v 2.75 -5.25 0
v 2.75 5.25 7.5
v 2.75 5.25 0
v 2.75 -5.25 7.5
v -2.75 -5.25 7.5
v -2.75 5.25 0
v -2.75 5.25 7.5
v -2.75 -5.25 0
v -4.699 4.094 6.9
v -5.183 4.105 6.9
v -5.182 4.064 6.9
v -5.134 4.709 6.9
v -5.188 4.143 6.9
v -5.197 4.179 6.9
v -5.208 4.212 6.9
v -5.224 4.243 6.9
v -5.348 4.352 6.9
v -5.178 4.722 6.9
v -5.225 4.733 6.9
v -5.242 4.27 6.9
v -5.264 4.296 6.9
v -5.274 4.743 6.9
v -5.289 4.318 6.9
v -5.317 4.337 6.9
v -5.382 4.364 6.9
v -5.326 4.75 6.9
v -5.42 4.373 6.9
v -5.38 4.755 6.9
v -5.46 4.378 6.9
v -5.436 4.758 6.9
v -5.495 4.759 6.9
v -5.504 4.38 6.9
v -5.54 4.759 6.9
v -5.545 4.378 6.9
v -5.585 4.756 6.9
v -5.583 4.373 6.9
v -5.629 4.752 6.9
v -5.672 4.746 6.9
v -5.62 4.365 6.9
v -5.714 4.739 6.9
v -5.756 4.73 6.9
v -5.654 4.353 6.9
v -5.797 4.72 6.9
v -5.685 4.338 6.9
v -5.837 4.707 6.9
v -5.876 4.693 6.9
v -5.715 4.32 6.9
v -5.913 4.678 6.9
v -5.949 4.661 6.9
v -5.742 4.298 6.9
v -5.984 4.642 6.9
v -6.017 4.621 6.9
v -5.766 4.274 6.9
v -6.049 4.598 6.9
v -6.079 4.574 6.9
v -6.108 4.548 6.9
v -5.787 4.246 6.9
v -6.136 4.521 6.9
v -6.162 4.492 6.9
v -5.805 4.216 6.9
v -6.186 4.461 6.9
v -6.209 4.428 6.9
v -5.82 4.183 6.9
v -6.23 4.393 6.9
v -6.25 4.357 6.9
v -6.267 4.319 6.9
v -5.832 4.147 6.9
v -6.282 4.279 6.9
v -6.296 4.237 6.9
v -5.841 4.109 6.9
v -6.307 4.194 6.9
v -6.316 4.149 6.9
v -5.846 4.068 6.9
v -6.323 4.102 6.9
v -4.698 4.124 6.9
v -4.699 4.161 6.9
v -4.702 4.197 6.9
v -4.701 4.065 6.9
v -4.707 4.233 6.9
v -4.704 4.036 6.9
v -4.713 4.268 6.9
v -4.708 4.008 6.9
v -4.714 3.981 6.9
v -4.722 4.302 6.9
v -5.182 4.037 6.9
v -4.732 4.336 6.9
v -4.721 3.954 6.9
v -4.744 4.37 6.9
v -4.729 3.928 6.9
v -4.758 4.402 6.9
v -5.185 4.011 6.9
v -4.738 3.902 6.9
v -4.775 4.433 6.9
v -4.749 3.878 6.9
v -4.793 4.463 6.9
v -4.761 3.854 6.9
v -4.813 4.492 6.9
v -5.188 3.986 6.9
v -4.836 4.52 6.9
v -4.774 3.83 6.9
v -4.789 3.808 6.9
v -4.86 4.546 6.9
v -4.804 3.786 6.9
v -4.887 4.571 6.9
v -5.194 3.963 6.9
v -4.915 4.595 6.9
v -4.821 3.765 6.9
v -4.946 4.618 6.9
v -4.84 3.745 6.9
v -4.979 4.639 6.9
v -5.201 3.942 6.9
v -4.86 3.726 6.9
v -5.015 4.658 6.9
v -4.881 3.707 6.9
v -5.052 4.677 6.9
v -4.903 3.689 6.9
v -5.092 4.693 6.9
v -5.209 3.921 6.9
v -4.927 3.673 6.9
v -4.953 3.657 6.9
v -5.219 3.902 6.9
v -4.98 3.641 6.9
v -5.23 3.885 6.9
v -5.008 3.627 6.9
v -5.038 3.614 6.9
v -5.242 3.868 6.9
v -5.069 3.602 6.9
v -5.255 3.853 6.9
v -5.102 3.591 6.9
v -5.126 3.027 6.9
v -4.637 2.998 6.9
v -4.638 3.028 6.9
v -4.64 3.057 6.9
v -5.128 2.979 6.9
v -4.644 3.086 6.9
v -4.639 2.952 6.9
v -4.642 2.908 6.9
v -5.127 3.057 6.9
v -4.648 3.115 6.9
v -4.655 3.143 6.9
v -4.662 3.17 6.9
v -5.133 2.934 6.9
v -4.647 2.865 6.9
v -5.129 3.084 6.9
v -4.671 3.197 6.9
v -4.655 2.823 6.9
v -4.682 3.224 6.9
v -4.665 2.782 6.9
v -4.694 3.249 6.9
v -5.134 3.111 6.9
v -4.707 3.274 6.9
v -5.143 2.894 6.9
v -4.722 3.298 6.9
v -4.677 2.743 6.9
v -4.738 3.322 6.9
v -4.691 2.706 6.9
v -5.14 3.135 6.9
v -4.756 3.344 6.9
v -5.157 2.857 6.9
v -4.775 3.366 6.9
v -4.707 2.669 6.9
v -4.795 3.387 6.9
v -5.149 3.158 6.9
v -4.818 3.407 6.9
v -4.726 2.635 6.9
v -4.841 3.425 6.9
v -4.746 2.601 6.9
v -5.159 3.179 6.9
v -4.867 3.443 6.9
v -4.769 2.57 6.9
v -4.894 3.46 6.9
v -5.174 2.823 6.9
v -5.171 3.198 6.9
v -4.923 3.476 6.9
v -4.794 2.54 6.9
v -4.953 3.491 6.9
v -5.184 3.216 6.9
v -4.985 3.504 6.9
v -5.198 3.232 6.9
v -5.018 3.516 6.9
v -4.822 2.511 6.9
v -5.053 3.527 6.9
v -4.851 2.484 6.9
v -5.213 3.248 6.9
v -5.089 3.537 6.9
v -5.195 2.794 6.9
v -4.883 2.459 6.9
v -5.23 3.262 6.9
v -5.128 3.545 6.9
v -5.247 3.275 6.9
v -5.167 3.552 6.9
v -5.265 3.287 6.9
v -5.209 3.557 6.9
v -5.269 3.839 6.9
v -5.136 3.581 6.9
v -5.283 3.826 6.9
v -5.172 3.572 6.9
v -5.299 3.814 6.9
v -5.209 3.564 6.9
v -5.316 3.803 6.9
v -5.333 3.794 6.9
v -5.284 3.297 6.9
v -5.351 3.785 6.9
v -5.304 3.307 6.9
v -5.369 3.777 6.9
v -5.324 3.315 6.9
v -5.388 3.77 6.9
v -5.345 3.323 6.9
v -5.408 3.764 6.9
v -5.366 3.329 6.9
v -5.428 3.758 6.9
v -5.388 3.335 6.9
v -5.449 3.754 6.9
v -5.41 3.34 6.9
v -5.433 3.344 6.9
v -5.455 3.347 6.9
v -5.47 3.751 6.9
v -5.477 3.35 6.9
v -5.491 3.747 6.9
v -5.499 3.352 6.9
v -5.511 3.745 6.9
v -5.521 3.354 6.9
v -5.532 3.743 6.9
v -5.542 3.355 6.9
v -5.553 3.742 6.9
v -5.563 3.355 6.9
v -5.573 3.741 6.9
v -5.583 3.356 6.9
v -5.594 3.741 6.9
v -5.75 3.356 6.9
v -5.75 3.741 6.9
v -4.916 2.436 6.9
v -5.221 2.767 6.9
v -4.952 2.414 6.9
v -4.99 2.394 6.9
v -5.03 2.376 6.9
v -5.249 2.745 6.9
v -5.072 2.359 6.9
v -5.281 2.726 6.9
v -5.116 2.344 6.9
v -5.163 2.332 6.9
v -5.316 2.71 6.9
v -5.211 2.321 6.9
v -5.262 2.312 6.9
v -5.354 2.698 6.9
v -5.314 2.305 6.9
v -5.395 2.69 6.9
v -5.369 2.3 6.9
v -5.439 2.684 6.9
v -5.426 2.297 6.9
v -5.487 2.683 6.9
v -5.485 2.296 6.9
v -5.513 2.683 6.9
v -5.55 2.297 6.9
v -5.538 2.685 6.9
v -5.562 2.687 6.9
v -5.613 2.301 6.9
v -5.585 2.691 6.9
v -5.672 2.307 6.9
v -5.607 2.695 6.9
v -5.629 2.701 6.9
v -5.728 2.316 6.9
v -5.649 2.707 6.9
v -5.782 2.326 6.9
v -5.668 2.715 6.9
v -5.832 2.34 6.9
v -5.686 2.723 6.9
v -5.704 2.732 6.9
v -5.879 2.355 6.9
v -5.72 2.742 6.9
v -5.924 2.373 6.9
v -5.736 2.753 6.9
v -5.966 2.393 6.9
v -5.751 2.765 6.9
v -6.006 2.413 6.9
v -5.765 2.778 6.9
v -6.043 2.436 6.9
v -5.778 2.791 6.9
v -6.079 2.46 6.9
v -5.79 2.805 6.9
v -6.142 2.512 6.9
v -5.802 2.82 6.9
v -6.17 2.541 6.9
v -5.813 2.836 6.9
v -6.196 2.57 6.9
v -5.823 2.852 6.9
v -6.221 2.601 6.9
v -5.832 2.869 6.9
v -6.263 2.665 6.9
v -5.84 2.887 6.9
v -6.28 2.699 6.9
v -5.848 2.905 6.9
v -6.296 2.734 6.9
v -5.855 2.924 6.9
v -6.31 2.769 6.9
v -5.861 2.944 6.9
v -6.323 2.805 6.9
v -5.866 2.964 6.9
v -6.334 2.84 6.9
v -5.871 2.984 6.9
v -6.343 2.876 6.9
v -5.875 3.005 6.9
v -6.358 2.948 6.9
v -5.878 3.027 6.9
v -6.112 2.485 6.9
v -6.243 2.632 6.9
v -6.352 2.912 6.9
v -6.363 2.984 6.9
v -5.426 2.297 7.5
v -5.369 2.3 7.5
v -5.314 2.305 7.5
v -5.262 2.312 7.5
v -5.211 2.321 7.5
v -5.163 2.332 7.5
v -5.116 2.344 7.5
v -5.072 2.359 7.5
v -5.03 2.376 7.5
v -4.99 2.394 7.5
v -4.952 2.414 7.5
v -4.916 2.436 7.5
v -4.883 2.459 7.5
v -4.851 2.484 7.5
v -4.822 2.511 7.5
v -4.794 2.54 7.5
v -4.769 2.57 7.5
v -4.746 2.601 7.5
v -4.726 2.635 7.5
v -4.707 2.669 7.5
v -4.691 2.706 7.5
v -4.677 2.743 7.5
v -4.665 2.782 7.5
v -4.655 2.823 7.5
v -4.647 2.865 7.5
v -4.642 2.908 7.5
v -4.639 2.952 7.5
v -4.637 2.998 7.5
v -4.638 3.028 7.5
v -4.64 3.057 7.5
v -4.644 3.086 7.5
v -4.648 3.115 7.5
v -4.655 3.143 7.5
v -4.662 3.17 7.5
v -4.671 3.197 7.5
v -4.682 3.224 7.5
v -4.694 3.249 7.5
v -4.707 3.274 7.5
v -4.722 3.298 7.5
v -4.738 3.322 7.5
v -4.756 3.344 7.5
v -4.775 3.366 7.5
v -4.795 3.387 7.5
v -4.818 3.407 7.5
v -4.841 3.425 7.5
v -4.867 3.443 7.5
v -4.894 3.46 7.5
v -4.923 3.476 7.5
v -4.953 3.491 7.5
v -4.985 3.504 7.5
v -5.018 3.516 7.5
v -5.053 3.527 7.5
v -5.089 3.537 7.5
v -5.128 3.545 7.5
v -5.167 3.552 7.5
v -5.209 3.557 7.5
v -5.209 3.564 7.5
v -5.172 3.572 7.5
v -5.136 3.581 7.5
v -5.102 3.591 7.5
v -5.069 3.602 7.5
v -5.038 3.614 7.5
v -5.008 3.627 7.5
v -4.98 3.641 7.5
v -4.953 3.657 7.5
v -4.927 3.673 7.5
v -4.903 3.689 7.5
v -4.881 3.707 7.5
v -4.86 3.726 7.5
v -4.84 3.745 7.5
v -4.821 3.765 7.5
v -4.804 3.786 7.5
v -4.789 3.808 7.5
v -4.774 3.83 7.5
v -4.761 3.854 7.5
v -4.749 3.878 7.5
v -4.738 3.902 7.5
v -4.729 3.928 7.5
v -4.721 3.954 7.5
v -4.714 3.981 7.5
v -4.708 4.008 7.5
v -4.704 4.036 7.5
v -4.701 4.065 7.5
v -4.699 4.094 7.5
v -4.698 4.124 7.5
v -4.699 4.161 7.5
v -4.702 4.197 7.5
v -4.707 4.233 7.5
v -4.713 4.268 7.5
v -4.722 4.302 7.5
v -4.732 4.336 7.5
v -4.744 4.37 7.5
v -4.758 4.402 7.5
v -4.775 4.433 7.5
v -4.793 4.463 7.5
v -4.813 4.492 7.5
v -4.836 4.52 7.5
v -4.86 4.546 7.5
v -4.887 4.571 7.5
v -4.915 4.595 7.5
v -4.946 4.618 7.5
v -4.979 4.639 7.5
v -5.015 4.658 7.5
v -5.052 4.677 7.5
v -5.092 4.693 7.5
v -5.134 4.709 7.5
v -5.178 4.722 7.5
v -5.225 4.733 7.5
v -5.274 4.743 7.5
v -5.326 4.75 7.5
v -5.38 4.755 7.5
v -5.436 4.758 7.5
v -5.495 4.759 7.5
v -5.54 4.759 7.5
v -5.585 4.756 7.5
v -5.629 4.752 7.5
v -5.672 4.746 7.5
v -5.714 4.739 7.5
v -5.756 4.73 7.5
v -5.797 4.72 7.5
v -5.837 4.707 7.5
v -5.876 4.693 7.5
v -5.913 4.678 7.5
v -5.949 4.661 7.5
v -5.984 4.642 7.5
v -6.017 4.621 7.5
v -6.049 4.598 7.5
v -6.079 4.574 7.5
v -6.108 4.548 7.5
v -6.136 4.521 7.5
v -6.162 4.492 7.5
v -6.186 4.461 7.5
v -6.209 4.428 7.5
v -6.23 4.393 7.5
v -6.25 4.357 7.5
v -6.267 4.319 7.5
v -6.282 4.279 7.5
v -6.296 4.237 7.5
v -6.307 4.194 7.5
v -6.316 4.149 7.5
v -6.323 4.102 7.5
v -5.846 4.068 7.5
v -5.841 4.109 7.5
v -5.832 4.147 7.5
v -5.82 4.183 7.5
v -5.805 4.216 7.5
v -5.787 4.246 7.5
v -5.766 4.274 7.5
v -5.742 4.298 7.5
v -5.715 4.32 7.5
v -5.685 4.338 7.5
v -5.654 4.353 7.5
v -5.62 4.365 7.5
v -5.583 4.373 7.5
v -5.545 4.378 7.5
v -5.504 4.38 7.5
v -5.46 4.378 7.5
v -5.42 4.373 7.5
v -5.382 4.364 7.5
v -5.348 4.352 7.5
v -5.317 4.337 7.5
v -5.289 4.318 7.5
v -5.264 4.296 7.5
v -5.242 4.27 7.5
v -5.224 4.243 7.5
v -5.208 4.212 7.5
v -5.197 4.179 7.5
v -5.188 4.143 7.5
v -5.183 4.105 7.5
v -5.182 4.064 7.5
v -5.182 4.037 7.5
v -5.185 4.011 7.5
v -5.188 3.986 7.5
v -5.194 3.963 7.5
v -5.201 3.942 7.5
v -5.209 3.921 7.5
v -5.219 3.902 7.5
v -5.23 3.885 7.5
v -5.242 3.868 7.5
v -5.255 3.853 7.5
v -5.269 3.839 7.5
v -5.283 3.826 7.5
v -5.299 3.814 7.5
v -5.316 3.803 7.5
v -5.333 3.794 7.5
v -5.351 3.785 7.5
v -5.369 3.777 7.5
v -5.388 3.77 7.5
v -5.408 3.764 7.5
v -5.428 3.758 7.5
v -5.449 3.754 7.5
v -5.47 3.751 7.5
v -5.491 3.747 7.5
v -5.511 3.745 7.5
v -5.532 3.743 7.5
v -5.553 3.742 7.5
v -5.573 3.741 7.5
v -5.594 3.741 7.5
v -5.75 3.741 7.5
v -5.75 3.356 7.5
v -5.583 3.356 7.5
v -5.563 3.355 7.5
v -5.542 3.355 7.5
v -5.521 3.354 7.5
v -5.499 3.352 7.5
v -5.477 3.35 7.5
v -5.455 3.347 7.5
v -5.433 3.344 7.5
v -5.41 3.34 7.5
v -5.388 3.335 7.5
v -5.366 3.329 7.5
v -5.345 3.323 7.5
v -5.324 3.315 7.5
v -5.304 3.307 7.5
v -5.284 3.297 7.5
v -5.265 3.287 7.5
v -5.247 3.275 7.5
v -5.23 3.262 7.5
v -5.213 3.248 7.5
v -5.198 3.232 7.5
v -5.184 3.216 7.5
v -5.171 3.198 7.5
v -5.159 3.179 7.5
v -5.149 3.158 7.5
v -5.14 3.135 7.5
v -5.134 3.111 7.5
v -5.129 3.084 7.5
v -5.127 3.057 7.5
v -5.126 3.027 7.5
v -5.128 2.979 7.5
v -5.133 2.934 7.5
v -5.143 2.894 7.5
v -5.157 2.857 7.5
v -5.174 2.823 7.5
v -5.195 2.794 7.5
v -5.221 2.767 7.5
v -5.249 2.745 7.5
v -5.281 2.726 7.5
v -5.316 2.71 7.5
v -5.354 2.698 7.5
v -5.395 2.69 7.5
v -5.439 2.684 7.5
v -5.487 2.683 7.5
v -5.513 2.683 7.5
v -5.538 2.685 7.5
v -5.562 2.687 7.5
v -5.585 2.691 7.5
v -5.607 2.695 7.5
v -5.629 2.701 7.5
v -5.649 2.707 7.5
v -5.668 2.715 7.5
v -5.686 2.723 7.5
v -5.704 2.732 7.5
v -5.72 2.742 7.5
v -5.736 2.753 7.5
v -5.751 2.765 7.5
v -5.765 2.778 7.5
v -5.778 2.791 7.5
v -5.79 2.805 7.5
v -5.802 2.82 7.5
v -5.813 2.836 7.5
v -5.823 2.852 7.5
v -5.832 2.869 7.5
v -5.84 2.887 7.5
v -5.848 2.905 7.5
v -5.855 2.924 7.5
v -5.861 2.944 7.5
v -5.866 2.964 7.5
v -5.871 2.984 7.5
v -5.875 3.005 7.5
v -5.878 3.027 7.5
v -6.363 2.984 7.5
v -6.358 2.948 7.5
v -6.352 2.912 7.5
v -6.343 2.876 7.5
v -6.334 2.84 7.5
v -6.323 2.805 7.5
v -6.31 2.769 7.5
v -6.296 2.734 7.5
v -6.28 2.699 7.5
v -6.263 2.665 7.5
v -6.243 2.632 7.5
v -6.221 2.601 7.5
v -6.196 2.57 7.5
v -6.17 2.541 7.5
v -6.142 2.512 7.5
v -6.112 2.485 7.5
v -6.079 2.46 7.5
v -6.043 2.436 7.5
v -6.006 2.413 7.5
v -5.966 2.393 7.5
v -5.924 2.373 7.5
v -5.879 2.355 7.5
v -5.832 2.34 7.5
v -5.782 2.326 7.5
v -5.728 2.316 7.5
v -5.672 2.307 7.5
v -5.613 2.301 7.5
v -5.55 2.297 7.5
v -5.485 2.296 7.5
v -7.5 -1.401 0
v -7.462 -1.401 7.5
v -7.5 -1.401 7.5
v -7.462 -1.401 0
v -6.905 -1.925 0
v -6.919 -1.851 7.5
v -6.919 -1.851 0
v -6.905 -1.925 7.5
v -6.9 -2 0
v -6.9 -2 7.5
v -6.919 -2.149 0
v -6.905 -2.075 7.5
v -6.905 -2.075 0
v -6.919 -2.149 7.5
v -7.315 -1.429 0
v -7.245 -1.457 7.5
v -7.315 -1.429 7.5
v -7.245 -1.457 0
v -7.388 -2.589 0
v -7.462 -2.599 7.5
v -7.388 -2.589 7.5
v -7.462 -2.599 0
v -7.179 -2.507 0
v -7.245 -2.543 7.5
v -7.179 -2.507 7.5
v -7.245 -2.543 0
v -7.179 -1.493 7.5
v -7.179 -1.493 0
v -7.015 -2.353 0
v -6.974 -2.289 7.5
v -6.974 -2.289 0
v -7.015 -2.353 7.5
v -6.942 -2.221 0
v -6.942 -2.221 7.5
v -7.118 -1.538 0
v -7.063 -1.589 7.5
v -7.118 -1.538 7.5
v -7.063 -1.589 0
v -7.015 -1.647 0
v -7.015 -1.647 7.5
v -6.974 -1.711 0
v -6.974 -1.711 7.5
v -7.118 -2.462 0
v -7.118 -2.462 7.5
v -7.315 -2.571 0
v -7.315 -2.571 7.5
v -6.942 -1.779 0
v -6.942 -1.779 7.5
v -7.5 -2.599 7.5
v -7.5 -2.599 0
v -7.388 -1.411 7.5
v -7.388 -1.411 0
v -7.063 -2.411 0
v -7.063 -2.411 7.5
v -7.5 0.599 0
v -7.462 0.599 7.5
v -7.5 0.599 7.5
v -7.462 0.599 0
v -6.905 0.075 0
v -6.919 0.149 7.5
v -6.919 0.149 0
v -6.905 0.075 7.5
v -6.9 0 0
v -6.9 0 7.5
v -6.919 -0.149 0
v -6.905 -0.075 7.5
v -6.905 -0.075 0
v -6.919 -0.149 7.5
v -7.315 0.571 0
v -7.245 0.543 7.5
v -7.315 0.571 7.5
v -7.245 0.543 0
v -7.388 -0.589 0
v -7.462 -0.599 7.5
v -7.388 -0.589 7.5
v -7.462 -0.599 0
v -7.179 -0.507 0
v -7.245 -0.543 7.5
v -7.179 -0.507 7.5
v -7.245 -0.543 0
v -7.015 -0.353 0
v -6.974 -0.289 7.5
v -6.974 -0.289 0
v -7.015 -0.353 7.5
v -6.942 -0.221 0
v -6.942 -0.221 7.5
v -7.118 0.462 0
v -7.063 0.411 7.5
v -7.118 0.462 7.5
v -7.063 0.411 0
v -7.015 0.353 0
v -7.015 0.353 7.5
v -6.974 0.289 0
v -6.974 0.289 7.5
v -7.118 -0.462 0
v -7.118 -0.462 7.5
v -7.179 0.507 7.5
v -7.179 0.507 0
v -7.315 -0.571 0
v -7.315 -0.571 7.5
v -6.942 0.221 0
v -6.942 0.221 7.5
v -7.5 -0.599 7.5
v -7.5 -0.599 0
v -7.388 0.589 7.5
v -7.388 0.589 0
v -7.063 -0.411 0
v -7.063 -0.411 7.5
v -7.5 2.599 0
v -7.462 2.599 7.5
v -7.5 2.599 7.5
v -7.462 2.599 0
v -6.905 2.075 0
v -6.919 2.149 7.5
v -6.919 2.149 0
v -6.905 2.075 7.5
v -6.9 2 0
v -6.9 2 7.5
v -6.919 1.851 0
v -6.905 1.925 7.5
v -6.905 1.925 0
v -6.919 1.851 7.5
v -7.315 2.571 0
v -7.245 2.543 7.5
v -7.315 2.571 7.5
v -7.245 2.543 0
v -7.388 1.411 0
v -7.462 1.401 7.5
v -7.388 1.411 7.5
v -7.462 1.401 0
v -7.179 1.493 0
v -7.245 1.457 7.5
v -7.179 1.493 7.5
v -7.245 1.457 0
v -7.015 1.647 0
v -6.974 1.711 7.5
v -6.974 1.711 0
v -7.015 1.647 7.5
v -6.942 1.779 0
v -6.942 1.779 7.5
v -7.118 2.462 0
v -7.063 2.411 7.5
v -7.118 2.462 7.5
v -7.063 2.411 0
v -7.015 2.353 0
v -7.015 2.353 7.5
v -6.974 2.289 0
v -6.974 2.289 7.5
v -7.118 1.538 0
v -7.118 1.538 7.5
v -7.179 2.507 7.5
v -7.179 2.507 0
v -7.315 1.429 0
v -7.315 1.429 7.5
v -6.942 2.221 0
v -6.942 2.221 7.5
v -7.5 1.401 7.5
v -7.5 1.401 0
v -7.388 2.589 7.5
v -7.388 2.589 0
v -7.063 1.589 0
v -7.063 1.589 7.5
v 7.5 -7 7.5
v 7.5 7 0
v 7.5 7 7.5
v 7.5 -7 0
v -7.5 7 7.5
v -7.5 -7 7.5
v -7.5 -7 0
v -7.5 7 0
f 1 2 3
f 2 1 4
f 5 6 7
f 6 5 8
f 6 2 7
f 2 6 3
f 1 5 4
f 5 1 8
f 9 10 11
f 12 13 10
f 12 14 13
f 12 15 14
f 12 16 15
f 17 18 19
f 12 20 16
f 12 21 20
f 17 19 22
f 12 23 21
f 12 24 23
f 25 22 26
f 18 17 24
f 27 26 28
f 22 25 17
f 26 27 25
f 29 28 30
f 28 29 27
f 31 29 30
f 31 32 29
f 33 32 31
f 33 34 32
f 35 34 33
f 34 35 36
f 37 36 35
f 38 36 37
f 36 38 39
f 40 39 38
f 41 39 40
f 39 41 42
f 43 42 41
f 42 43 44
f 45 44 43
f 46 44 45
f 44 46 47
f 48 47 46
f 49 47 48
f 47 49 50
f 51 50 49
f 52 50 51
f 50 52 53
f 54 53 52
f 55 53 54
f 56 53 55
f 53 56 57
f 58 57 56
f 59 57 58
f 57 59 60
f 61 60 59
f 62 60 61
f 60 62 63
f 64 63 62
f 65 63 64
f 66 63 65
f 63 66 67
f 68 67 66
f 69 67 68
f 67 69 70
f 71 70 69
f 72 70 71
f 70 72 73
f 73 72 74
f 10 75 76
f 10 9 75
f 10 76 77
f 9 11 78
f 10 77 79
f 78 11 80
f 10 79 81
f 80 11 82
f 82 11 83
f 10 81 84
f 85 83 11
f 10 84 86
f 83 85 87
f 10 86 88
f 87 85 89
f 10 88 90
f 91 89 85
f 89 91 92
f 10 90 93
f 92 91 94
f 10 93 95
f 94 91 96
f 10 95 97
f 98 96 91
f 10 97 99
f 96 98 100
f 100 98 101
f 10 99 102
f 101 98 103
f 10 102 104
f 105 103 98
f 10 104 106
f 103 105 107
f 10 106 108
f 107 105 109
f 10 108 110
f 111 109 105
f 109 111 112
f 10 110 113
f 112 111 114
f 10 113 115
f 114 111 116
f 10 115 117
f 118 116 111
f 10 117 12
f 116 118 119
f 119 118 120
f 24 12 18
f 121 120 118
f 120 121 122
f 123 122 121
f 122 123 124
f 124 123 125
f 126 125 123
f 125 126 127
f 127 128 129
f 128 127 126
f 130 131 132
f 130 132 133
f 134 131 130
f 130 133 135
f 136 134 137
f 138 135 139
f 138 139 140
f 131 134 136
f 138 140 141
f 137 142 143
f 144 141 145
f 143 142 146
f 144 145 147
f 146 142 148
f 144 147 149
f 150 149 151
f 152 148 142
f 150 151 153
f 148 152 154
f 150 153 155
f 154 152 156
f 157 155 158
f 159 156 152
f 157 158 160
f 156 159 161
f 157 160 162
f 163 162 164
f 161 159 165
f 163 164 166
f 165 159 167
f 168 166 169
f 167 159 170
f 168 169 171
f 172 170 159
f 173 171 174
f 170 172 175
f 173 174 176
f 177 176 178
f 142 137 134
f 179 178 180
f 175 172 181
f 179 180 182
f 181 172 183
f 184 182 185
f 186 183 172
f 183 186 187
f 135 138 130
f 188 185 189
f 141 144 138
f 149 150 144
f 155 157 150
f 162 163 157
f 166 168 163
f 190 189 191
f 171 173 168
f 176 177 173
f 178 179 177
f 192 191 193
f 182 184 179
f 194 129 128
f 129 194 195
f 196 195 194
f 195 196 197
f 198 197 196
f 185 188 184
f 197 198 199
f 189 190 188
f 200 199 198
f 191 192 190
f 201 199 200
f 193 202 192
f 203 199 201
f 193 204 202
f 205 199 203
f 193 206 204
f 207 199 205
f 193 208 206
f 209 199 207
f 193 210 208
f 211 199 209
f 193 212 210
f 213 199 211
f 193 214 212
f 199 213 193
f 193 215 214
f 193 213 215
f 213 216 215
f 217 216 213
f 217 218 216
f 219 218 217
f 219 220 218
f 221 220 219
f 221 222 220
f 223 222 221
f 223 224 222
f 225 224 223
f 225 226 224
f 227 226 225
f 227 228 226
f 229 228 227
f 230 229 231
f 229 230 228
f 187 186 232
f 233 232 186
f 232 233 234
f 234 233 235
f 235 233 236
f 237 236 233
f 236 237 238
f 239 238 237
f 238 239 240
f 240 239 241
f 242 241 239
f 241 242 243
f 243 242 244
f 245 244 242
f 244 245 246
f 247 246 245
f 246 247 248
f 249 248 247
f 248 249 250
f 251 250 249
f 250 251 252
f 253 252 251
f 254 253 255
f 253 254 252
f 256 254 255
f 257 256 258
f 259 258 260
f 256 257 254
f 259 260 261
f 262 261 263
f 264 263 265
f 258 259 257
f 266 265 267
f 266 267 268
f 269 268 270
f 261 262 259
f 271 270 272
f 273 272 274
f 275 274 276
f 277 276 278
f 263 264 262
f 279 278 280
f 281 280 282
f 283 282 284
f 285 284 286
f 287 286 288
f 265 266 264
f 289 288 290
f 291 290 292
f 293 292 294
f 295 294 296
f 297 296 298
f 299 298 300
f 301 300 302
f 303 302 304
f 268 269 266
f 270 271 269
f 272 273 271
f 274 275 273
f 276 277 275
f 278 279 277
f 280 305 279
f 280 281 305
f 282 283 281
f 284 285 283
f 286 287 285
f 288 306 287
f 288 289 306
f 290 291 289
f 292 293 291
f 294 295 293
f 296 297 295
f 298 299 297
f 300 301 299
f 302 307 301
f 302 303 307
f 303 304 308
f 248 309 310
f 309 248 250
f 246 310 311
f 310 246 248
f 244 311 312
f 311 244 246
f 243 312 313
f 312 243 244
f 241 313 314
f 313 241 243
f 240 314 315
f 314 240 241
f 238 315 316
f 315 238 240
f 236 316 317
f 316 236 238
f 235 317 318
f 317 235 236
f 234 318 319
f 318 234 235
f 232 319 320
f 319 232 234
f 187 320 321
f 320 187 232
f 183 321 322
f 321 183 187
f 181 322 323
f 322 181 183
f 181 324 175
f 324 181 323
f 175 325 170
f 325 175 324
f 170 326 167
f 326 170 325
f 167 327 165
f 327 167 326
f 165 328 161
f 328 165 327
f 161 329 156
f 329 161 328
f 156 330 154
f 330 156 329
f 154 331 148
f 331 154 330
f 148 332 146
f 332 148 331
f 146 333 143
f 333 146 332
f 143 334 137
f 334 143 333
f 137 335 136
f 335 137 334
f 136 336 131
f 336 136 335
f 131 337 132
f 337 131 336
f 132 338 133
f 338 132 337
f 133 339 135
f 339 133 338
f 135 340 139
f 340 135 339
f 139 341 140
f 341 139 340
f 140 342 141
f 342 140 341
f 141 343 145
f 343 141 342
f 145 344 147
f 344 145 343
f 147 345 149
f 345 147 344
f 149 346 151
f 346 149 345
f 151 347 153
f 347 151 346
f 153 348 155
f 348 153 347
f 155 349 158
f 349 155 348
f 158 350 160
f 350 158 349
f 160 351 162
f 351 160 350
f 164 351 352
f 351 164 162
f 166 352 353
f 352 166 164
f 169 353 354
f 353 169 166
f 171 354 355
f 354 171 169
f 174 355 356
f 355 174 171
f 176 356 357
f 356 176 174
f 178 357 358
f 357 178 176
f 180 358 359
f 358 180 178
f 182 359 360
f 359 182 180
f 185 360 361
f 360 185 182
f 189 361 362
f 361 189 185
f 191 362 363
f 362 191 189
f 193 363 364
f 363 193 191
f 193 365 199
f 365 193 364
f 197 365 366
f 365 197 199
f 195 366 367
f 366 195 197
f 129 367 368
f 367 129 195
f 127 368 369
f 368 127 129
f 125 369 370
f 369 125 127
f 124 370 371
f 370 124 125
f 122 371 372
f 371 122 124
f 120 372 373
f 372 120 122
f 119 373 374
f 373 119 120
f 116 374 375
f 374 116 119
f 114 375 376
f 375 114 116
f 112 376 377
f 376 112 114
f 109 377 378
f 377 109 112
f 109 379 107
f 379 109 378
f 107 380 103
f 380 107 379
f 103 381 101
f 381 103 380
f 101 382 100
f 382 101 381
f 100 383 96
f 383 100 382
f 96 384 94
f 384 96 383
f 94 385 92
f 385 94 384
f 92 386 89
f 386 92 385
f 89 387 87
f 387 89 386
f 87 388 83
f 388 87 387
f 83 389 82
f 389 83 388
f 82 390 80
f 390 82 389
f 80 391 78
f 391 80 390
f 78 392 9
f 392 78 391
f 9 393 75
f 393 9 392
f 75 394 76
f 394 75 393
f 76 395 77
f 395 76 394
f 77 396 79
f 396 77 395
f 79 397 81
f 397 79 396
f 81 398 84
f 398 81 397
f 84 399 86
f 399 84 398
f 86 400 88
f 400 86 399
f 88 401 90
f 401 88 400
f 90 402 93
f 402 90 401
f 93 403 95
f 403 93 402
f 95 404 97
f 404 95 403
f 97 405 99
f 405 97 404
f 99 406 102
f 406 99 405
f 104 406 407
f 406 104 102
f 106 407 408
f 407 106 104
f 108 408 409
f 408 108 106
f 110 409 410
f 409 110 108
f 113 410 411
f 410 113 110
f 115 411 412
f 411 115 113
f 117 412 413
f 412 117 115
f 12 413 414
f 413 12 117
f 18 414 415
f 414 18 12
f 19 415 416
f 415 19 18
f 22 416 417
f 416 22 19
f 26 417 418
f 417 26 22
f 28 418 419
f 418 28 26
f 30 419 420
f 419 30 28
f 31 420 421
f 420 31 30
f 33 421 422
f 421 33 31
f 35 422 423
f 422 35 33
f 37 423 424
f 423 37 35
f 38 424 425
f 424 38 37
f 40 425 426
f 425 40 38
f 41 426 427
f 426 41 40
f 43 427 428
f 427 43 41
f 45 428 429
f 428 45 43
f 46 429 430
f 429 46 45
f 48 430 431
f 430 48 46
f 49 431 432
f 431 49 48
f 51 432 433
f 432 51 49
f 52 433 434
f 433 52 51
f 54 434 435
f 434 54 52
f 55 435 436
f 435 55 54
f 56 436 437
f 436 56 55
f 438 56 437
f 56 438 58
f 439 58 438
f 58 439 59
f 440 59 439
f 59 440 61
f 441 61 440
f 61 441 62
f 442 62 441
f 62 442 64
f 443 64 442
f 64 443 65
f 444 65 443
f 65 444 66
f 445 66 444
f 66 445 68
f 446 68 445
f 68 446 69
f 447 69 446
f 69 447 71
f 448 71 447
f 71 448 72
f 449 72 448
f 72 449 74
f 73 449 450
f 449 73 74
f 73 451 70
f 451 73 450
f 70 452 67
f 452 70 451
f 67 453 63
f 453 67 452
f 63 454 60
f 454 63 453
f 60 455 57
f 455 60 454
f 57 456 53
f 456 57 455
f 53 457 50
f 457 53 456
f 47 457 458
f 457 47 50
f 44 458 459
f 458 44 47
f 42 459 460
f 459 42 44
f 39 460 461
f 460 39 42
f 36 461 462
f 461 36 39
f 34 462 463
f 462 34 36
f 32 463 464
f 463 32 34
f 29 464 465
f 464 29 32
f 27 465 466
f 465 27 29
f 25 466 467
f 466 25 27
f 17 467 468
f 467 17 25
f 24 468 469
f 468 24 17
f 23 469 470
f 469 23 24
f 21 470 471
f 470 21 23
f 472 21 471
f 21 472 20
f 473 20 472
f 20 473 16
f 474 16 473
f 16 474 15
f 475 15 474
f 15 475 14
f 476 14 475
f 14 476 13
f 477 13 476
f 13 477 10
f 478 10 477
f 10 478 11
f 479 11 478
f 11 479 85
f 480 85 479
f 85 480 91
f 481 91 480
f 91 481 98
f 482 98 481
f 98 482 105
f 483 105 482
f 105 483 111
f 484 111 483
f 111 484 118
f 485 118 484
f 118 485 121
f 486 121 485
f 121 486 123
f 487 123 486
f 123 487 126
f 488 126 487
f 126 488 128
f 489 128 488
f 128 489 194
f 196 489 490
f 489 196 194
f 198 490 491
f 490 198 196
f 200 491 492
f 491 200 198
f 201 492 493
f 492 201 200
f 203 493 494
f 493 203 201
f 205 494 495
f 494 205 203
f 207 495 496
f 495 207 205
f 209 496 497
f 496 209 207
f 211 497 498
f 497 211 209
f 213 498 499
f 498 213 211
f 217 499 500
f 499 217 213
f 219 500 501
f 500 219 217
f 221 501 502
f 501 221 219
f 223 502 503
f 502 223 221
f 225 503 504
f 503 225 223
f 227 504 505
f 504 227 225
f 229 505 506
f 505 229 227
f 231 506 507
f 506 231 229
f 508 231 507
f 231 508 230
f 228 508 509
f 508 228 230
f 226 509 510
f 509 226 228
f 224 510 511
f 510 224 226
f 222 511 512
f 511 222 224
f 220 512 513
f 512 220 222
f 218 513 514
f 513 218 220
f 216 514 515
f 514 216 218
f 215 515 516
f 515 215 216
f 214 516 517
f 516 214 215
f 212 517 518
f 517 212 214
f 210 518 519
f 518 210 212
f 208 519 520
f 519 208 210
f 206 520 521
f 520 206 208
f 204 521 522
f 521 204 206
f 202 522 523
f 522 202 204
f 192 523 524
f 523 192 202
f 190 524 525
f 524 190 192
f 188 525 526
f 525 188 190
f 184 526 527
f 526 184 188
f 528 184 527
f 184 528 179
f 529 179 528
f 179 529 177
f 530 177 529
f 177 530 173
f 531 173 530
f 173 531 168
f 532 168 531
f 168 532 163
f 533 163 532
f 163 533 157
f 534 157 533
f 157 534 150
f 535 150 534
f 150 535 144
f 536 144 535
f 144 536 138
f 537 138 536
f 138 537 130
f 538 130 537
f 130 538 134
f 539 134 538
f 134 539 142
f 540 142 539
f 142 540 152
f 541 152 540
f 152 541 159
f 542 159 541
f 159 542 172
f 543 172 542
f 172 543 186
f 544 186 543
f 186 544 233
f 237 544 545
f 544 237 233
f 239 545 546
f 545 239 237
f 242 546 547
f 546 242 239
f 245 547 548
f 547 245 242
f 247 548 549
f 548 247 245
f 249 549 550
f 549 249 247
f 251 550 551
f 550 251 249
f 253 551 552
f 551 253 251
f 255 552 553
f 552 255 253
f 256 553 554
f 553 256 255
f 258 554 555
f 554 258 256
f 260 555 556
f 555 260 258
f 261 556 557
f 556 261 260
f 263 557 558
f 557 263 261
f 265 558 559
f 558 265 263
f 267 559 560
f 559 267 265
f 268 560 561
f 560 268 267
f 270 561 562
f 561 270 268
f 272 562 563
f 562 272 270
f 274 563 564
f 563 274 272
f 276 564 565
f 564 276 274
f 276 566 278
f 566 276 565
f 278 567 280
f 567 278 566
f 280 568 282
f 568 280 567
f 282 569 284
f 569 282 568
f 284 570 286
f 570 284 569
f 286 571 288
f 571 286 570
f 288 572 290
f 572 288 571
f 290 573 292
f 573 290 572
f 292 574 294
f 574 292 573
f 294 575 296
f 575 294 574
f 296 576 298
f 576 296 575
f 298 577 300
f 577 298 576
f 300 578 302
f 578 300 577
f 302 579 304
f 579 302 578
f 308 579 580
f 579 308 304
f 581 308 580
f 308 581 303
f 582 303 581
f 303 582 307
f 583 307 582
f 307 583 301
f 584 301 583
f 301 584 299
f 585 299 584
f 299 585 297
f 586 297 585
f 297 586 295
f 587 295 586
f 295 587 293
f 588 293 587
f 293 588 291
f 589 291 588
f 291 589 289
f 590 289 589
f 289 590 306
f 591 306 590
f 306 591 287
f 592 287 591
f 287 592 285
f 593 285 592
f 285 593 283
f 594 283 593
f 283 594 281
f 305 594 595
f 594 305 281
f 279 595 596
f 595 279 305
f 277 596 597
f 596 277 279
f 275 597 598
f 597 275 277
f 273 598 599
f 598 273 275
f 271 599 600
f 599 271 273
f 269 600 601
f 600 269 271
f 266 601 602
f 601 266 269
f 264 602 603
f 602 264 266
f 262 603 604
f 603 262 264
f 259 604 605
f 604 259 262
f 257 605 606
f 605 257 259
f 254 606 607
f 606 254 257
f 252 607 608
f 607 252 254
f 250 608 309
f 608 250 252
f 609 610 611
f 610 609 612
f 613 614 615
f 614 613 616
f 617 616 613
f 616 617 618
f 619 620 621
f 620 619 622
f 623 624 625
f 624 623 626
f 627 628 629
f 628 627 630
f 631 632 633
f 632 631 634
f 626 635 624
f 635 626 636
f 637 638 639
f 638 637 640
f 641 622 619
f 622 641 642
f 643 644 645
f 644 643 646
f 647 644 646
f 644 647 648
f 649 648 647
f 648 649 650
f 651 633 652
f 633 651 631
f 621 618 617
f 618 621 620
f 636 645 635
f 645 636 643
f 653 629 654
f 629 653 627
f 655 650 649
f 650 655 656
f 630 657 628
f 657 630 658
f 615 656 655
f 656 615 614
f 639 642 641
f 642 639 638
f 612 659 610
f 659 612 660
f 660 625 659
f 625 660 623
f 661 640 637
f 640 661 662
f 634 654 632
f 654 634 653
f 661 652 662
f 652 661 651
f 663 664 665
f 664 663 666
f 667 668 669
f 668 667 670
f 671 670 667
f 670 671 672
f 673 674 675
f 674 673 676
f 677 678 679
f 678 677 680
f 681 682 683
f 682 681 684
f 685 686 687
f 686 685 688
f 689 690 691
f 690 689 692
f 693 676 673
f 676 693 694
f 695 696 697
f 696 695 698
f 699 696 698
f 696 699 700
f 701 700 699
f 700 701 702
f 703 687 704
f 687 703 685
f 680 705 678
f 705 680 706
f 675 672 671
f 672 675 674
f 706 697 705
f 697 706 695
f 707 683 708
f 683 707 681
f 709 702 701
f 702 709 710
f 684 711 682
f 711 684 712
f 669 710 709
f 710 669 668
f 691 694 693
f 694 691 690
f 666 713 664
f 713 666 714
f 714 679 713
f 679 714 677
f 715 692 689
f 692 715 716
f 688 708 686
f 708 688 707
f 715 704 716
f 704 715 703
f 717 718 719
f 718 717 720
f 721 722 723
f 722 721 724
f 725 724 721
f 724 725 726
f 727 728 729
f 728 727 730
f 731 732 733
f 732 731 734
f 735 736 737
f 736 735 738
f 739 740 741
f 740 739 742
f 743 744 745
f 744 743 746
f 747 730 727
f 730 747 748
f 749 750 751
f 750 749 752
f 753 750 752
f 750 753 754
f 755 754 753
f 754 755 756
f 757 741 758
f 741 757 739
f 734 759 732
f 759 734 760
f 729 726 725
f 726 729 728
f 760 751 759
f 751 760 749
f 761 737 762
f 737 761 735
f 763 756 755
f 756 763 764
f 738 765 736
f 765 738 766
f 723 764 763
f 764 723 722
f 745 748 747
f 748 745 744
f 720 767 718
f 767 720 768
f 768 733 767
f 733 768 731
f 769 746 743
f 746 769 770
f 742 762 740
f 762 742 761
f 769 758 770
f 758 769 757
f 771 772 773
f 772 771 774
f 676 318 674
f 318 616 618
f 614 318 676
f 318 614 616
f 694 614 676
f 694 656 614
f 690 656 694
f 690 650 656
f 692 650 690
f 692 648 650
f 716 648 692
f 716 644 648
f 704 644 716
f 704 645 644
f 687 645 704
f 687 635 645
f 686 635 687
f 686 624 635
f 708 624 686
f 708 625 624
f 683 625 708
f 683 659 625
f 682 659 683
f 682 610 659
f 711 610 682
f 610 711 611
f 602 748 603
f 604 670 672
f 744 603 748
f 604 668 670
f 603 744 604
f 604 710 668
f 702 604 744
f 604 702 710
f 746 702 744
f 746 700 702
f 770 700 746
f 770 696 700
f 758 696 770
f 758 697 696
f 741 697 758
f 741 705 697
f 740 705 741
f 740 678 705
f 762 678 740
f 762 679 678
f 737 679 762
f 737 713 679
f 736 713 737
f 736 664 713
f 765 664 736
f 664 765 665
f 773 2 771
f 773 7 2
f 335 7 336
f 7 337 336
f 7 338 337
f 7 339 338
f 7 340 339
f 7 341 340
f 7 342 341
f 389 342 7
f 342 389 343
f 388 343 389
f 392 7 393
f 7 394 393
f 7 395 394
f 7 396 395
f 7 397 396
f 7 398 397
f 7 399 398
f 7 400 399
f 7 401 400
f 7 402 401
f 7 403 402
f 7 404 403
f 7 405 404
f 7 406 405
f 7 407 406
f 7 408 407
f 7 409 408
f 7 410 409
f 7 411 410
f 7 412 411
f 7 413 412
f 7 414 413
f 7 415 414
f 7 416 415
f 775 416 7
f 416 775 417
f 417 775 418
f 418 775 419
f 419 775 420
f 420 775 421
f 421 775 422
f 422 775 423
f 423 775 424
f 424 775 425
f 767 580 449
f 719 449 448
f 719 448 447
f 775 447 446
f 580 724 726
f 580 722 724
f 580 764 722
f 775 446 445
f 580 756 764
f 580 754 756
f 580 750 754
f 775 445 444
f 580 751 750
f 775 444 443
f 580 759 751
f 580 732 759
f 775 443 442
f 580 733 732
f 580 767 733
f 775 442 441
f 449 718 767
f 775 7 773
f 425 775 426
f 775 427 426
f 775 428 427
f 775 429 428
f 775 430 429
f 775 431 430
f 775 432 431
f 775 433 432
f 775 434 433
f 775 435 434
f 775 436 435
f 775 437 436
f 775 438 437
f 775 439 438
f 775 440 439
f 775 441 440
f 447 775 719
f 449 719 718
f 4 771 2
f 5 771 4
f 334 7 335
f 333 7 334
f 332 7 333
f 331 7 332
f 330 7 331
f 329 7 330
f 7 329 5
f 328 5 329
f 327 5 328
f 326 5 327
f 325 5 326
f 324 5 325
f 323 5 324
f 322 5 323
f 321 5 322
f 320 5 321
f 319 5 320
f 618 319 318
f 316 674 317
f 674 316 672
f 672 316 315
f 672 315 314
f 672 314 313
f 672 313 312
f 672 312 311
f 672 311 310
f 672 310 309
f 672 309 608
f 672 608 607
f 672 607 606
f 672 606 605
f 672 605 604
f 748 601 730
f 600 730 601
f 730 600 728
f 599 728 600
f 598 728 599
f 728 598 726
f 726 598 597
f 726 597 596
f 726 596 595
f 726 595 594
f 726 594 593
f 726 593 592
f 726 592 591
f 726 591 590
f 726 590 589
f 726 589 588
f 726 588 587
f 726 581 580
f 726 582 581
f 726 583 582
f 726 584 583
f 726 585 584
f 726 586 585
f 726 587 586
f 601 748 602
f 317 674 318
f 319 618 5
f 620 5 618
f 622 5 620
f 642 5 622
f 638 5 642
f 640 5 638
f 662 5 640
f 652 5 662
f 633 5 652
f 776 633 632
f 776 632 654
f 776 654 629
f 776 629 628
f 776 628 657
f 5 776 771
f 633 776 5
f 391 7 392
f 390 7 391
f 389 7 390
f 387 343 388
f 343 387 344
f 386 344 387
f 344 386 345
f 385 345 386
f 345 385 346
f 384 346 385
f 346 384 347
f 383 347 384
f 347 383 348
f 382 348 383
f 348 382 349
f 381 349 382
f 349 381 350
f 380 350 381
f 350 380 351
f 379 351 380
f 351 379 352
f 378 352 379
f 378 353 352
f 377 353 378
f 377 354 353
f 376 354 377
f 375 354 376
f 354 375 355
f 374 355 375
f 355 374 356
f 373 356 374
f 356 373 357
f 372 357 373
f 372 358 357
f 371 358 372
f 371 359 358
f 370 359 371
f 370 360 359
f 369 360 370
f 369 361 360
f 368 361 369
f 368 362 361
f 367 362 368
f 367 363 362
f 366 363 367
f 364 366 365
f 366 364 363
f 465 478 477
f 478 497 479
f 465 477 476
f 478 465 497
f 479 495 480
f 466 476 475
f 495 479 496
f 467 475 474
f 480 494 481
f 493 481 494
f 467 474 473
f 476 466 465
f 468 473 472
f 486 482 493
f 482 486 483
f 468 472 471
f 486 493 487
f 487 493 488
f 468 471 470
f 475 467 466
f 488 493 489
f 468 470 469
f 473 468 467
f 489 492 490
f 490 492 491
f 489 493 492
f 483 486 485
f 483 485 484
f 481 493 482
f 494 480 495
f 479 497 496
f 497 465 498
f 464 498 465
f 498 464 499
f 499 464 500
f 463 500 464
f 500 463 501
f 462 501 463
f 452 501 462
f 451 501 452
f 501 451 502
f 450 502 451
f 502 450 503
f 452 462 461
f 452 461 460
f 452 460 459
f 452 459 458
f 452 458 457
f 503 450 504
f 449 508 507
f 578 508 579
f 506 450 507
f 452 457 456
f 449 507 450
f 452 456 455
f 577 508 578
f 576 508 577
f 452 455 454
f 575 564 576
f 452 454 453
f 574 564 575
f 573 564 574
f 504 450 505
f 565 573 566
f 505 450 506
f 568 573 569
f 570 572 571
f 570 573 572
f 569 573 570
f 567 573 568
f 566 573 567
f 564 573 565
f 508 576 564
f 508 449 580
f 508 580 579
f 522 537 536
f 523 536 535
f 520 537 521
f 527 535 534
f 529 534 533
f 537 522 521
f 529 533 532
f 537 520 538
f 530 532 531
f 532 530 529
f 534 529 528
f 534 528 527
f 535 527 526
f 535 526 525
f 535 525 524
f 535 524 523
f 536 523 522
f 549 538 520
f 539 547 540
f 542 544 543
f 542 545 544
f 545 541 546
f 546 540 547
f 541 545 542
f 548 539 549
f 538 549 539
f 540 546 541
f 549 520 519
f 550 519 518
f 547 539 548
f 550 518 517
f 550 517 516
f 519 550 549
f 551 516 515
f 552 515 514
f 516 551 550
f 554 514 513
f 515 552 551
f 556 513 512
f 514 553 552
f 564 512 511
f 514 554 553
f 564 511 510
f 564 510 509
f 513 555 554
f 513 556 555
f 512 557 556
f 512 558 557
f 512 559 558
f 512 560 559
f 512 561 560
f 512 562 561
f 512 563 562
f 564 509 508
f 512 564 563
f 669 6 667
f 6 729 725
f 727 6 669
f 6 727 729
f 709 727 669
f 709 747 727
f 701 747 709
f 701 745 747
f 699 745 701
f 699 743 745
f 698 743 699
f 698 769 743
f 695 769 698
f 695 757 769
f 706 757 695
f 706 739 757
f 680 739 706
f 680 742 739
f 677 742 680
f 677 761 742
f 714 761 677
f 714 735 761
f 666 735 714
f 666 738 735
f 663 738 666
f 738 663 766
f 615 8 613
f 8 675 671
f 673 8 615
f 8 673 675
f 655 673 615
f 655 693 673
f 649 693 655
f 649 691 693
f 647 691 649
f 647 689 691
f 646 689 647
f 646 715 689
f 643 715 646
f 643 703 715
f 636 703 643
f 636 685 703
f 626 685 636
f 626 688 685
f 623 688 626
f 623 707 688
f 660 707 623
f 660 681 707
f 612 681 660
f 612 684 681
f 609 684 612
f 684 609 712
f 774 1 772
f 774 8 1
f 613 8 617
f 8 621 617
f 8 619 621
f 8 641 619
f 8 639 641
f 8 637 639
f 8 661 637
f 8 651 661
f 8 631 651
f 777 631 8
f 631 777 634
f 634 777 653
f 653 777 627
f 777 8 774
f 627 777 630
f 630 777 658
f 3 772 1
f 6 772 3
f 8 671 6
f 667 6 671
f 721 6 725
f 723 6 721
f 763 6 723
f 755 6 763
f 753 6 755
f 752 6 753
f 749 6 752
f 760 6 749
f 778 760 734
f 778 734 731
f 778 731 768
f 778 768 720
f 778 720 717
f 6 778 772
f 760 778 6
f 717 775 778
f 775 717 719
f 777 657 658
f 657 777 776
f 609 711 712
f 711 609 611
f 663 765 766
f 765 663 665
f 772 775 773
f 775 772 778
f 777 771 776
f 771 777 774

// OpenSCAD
$fn = 50;

difference() {
	union() {
		translate(v = [0, -5, 0]) {
			rotate(a = [0, 0, 0]) {
				difference() {
					union() {
						translate(v = [-7.5, -2.0, 0]) {
							cube(size = [15.0, 14.0, 7.5]);
						}
					}
					union() {
						translate(v = [-2.75, -0.25, -0.1]) {
							cube(size = [5.5, 10.5, 7.7]);
						}
						translate(v = [-5.5, 8.5, 6.9]) {
							linear_extrude(height = 0.7) {
								text(font = "Arial:style=Bold", halign = "center", size = 2.5, text = "3", valign = "center");
							}
						}
						translate(v = [-7.5, 3, -0.1]) {
							cylinder(h = 7.7, r = 0.6);
						}
						translate(v = [-7.5, 5, -0.1]) {
							cylinder(h = 7.7, r = 0.6);
						}
						translate(v = [-7.5, 7, -0.1]) {
							cylinder(h = 7.7, r = 0.6);
						}
					}
				}
			}
		}
	}
	union();
}
